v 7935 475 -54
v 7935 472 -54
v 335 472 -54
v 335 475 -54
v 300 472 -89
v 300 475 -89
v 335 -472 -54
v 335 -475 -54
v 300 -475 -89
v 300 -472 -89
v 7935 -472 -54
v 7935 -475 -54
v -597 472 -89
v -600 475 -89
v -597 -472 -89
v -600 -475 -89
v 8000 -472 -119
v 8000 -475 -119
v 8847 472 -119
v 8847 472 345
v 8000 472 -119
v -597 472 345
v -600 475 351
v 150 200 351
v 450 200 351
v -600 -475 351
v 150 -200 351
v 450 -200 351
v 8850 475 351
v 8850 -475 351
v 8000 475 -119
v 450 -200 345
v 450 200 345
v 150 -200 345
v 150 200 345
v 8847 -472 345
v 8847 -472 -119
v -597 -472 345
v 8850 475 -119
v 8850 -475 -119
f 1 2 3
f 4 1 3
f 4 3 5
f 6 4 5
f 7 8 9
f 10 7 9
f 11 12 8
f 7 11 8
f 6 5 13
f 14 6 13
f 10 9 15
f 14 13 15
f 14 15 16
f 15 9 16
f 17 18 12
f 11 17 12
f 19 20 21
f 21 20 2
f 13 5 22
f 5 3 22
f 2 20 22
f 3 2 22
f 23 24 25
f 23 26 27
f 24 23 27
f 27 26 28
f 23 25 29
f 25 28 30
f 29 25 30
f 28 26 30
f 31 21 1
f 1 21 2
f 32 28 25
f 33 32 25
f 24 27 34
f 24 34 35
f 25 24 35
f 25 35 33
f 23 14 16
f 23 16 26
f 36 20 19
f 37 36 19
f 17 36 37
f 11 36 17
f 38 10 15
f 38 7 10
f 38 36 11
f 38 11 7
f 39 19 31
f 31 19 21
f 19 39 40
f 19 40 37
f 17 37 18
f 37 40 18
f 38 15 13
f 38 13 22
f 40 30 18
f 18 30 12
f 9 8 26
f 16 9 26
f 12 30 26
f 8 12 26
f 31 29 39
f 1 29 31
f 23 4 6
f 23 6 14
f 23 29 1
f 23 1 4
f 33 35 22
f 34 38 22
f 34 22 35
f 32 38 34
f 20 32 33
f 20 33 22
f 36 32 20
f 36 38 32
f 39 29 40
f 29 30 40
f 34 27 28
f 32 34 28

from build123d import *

# Parameters (mm, degrees)
SKETCH061_W      = 300
SKETCH061_H      = 400
EXTRUDE035_DEPTH = 25
EXTRUDE034_DEPTH = 472
EXTRUDE012_DEPTH = 475


with BuildPart() as extrude035:
    # Sketch061 (on Face3 of Cut005) → Extrude035 (new body, symmetric)
    with BuildSketch(Plane.XY.offset(351)):
        with Locations((300, 0)):
            Rectangle(SKETCH061_W, SKETCH061_H)
    extrude(amount=EXTRUDE035_DEPTH, both=True)


with BuildPart() as extrude034:
    # Sketch060 → Extrude034 (new body, symmetric)
    with BuildSketch(Plane.XZ):
        Polygon((-597, -89), (-597, 348), (8847, 348), (8847, -119), (8000, -119), (7935, -54), (335, -54), (300, -89), align=None)
    extrude(amount=EXTRUDE034_DEPTH, both=True)


with BuildPart() as extrude034_1:
    # Extrude034 placement: moved
    add(extrude034.part.moved(Location((0, 0, -3))))


with BuildPart() as cut007:
    # Sketch020 → Extrude012 (new body, symmetric)
    with BuildSketch(Plane.XZ):
        Polygon((-600, -89), (-600, 351), (8850, 351), (8850, -119), (8000, -119), (7935, -54), (335, -54), (300, -89), align=None)
    extrude(amount=EXTRUDE012_DEPTH, both=True)

    # Cut005: cut Extrude034
    add(extrude034_1.part, mode=Mode.SUBTRACT)

    # Cut007: cut Extrude035
    add(extrude035.part, mode=Mode.SUBTRACT)


solid = cut007.part
